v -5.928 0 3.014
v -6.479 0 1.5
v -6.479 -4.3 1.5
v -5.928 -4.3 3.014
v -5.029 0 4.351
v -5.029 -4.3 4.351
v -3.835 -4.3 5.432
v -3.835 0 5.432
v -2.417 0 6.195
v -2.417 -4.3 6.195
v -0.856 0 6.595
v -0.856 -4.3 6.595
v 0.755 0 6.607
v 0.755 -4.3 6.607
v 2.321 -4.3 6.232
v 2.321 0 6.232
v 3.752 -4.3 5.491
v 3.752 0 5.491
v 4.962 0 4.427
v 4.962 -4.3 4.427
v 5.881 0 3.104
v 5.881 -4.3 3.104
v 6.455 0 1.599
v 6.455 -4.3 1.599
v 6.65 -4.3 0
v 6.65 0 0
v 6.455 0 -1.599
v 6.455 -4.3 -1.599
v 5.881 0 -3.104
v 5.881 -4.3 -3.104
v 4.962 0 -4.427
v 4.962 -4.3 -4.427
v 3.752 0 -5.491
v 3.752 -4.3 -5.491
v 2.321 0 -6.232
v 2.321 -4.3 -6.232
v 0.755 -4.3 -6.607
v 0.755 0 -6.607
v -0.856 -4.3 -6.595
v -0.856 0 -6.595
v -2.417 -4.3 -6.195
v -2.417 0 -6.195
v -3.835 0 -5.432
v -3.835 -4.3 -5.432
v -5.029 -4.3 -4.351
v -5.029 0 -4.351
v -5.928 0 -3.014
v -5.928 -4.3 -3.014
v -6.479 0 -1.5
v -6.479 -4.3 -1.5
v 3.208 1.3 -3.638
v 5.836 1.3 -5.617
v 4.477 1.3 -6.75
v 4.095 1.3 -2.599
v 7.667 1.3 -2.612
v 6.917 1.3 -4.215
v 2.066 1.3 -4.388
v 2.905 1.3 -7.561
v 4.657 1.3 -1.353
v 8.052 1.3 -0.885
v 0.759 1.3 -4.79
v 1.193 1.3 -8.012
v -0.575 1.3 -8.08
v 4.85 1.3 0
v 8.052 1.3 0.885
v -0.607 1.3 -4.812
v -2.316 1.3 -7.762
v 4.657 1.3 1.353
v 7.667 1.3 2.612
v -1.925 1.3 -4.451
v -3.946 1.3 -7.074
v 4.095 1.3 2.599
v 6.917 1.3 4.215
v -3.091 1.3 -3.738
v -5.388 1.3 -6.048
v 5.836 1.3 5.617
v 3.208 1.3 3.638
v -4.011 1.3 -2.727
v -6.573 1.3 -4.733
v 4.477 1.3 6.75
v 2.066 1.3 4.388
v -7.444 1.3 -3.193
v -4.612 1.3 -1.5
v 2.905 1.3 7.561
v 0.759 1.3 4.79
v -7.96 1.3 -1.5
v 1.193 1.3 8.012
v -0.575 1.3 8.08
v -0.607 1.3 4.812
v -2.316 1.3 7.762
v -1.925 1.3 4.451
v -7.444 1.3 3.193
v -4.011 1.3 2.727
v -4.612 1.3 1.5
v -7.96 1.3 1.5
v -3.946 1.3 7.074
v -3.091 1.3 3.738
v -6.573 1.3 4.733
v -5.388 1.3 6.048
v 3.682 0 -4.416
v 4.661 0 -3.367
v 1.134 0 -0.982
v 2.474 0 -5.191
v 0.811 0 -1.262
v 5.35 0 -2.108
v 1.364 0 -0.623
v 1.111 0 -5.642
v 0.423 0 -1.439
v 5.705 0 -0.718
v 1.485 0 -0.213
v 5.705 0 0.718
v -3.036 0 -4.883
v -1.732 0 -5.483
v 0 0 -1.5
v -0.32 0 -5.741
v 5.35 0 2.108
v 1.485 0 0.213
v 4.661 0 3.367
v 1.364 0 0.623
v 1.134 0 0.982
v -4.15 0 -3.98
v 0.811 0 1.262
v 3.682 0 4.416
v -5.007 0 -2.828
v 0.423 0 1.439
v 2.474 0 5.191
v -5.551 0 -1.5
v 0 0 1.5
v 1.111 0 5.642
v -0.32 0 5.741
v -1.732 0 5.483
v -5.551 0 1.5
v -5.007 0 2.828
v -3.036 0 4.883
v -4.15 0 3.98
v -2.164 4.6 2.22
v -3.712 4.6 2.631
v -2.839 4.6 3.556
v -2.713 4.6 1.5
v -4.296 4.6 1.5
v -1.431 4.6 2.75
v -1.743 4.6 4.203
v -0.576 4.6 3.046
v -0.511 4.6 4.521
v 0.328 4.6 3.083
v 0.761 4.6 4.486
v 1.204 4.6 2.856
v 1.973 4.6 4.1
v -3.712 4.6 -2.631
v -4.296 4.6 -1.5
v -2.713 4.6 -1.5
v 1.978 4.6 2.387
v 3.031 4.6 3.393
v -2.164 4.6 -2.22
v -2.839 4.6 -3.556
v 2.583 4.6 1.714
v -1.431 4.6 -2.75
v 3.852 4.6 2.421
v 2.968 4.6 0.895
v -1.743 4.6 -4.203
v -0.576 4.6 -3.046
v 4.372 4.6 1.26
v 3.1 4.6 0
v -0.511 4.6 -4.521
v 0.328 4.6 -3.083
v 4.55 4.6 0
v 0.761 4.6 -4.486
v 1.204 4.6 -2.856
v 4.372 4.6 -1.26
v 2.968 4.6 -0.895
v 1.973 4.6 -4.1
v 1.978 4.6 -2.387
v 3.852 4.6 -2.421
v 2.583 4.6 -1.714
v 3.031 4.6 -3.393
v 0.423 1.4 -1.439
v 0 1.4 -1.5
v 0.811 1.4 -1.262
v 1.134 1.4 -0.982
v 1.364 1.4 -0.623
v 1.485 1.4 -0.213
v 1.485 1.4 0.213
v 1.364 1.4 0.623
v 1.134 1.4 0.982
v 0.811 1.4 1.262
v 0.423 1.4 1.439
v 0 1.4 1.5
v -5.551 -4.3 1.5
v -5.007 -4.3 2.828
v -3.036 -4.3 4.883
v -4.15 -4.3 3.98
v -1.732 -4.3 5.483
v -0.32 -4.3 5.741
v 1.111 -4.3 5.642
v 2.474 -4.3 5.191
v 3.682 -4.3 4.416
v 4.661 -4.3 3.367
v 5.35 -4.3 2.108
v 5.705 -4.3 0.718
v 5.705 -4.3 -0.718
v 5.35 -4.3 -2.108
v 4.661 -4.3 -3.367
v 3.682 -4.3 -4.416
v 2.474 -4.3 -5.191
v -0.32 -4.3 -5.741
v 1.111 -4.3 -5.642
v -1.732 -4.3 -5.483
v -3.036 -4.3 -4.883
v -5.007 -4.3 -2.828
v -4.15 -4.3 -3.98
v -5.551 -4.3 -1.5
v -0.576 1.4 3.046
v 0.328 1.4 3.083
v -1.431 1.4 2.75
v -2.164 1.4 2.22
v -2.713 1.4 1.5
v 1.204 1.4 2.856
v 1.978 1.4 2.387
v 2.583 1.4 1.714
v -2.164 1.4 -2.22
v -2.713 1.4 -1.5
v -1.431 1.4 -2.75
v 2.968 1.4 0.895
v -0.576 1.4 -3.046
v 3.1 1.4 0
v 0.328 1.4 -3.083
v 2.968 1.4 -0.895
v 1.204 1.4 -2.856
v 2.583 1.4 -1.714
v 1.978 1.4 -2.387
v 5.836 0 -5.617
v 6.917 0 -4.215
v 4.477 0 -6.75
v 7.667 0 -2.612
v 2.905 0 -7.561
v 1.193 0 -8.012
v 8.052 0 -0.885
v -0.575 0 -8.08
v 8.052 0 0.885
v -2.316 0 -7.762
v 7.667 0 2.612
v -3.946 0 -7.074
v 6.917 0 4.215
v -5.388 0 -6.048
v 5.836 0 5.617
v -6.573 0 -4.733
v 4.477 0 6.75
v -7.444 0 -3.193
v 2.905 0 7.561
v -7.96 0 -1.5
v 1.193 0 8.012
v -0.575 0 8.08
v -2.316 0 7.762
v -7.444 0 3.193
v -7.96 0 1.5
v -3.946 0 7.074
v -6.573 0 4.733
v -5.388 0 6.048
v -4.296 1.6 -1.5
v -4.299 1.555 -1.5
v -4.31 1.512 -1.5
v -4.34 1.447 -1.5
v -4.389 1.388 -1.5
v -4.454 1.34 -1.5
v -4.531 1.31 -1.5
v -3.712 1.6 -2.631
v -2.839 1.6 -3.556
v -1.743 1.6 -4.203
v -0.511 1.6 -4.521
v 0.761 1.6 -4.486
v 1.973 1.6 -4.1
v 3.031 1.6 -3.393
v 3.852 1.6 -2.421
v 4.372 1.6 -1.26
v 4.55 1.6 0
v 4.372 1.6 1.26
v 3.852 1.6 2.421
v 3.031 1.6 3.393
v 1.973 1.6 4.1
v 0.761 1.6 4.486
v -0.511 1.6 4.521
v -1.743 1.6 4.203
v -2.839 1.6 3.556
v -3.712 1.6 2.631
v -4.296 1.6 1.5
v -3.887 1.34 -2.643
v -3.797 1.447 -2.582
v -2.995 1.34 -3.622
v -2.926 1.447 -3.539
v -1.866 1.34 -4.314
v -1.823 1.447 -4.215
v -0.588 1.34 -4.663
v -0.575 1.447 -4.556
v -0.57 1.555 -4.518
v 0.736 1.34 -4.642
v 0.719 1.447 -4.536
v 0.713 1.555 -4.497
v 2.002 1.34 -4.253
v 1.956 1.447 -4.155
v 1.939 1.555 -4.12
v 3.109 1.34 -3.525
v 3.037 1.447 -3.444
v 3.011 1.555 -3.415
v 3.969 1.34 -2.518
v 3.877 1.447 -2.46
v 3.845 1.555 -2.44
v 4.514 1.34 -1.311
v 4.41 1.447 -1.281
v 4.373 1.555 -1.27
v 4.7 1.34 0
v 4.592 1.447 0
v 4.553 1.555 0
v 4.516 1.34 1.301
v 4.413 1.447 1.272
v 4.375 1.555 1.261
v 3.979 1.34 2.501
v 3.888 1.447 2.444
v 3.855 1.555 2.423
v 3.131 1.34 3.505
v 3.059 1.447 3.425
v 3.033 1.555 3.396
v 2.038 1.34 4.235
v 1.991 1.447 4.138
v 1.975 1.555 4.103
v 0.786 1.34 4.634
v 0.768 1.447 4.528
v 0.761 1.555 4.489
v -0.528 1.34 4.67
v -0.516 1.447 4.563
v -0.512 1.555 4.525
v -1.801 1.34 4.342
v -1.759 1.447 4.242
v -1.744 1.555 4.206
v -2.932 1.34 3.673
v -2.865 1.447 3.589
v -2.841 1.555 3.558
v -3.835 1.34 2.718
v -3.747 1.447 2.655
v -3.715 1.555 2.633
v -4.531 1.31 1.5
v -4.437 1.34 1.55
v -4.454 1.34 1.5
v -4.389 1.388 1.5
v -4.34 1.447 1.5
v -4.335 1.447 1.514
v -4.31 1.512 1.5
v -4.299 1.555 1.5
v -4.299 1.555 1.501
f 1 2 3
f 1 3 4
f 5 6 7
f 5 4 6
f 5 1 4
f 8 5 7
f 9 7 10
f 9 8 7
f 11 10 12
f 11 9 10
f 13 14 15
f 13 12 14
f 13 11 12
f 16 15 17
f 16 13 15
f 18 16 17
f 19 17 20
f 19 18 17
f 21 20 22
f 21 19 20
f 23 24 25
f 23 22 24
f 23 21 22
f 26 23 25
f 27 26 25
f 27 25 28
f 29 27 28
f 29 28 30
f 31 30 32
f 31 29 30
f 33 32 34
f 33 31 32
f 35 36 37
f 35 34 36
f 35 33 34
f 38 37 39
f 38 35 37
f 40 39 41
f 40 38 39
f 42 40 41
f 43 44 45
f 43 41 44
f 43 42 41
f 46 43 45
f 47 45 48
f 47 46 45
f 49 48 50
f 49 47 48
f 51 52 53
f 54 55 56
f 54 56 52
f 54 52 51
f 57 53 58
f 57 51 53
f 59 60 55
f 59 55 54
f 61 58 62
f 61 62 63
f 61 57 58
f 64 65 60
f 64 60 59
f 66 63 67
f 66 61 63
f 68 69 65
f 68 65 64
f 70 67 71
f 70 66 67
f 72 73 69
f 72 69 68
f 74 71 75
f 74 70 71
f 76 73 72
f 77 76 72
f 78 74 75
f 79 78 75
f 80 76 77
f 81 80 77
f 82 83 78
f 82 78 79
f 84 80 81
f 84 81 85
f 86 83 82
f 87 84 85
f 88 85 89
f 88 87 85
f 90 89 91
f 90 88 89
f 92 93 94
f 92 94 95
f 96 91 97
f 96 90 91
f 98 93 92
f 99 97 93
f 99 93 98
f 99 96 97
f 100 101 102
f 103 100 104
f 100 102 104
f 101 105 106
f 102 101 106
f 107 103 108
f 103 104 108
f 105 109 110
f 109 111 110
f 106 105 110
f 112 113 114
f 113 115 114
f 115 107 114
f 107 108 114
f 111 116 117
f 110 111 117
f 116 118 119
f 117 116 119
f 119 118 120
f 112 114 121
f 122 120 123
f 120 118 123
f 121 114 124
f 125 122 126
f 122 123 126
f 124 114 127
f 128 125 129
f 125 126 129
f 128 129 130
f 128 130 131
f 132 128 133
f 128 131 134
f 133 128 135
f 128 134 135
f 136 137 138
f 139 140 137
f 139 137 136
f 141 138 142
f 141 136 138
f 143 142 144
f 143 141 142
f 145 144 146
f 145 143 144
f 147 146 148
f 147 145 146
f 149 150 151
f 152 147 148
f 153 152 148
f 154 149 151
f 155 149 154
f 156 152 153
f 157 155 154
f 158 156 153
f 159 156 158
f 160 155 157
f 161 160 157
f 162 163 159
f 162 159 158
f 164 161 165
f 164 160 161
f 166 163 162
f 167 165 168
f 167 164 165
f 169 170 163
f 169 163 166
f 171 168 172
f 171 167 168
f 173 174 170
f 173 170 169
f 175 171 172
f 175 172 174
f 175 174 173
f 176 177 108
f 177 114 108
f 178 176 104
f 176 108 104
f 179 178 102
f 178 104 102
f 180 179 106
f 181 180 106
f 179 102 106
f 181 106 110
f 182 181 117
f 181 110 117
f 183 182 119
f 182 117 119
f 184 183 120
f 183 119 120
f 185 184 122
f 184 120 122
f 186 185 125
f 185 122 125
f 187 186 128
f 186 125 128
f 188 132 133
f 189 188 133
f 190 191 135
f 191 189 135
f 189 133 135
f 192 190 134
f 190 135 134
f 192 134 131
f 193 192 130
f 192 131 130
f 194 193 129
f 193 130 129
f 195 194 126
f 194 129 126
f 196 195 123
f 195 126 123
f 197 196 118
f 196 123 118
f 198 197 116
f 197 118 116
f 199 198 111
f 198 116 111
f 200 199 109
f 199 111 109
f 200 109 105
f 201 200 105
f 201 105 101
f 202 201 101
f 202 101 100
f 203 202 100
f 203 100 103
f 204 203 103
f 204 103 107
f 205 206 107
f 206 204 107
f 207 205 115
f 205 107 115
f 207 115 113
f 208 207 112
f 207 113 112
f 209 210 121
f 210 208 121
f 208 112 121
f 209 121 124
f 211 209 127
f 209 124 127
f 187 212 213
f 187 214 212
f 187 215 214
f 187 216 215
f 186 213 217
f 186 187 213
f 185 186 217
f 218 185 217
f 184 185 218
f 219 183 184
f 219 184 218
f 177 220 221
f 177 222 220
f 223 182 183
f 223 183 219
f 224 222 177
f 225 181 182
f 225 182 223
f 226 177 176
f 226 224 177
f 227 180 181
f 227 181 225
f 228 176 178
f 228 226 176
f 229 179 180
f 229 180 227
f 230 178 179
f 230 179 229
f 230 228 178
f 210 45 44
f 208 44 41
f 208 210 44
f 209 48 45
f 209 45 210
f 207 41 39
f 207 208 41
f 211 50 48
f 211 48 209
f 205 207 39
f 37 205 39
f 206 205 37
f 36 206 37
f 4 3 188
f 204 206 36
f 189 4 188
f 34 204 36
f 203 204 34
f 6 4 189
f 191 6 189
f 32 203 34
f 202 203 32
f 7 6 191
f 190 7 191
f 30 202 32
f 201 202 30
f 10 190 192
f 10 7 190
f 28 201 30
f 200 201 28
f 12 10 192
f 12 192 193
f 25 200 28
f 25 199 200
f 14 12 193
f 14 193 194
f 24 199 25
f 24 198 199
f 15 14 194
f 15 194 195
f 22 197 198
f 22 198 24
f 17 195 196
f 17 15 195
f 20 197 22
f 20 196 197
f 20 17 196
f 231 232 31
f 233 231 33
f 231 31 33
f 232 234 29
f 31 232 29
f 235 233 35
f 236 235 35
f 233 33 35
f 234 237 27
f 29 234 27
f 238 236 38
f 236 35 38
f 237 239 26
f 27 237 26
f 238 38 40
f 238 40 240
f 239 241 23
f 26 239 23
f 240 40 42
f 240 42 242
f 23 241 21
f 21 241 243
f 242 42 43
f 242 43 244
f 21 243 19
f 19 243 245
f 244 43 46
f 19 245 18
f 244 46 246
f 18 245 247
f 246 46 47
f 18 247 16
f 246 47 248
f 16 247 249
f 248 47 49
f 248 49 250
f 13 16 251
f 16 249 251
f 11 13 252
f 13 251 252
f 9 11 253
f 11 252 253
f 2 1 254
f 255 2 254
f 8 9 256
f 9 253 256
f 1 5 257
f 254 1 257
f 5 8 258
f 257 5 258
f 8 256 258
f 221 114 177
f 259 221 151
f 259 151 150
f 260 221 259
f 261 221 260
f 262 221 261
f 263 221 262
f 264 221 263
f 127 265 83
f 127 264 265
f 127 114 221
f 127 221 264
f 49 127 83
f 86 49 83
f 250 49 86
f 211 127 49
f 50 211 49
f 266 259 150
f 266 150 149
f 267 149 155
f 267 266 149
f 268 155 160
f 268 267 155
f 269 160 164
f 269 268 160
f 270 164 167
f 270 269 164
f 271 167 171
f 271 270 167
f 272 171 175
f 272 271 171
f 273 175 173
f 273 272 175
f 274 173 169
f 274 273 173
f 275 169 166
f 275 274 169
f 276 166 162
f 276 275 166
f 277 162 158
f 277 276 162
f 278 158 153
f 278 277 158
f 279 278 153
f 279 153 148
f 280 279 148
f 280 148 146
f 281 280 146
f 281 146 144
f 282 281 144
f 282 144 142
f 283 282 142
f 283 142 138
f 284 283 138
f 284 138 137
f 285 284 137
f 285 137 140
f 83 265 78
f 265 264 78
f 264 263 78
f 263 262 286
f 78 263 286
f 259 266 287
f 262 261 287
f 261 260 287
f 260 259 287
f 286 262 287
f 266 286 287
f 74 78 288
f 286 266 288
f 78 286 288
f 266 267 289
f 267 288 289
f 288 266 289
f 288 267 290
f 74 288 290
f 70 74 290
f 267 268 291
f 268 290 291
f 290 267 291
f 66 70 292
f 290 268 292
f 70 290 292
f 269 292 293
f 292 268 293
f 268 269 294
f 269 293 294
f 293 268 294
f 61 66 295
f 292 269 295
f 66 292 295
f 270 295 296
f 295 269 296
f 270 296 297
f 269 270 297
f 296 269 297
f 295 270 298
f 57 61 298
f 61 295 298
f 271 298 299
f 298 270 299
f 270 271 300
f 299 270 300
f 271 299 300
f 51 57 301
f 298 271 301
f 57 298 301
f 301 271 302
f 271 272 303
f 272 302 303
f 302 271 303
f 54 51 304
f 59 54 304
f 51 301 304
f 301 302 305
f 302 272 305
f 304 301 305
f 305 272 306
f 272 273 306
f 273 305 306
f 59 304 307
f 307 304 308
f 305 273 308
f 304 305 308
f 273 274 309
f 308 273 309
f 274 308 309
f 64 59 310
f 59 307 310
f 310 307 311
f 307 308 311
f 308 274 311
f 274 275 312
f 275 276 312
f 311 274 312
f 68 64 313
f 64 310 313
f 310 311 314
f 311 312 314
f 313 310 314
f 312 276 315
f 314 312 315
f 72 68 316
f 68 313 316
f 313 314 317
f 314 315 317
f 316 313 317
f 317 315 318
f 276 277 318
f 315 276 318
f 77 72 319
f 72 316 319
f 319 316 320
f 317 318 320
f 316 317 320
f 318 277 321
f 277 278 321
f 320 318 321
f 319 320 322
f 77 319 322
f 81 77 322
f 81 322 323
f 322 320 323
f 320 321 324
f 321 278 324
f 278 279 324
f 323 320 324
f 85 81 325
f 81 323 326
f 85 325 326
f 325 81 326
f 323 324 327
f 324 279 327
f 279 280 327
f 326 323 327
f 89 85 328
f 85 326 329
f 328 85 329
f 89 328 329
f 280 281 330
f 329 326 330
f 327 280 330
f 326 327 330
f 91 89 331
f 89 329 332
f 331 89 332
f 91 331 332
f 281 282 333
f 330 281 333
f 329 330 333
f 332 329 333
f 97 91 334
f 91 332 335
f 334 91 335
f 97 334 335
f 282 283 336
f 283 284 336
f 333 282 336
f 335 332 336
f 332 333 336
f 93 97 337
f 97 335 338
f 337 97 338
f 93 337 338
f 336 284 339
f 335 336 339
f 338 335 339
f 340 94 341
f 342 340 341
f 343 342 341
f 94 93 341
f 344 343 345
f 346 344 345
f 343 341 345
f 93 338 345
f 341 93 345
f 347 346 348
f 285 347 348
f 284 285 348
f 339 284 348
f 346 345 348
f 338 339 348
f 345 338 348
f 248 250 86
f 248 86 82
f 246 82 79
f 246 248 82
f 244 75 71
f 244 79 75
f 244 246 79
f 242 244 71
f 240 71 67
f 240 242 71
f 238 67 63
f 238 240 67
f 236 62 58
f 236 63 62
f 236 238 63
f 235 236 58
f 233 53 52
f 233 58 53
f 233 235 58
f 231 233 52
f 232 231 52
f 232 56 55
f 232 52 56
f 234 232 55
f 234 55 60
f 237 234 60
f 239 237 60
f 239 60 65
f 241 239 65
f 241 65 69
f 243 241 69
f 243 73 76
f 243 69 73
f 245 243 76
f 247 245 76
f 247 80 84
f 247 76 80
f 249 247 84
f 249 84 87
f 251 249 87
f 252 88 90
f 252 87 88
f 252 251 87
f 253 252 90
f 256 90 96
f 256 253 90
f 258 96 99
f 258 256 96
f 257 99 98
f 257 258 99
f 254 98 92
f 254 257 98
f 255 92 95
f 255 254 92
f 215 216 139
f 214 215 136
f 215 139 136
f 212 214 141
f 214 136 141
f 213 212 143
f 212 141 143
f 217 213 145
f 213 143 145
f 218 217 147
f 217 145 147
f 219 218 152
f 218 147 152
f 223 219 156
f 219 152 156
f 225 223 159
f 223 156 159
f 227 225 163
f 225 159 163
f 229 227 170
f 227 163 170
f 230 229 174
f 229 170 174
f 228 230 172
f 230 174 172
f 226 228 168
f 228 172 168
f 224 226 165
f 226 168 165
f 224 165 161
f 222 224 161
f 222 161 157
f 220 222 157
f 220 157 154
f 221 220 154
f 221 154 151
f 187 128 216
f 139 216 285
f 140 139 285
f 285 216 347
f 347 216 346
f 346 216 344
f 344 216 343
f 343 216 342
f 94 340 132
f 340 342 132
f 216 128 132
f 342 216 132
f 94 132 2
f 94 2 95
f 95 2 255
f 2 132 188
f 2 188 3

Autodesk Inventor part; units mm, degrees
ref_plane "YZ Plane" through (0, 0, 0) normal (1, 0, 0) x (0, 1, 0)
ref_plane "XZ Plane" through (0, 0, 0) normal (0, 1, 0) x (-1, 0, 0)
ref_plane "XY Plane" through (0, 0, 0) normal (0, 0, 1) x (1, 0, 0)
sketch "Boceto1" plane through (0, 0, 0) normal (0, 1, 0) x (-1, 0, 0)
  circle A0 centre (0, 0) radius 8.1
  dimension "d0" = 16.2
extrude "Extrusión1" add sketch "Boceto1" along normal blind 1.3
sketch "Boceto2" plane through (0, 1.3, 0) normal (0, 1, 0) x (1, 0, 0)
  circle A0 centre (0, 0) radius 4.55
  dimension "d3" = 9.1
extrude "Extrusión2" add sketch "Boceto2" along normal blind 3.3
sketch "Boceto3" plane through (0, 4.6, 0) normal (0, 1, 0) x (1, 0, 0)
  circle A0 centre (0, 0) radius 3.1
  dimension "d6" = 6.2
extrude "Extrusión3" cut sketch "Boceto3" against normal blind 3.2
sketch "Boceto4" plane through (0, 1.4, 0) normal (0, 1, 0) x (1, 0, 0)
  arc A0 (0, -1.5) -> (0, 1.5) centre (0, 0) ccw
  line L0 (0, -1.5) -> (-7.9599, -1.5)
  circle A1 centre (0, 0) radius 8.1 projected
  line L1 (0, 1.5) -> (-7.9599, 1.5)
  arc A2 (-7.9599, 1.5) -> (-7.9599, -1.5) centre (0, 0) ccw
  dimension "d9" = 3
extrude "Extrusión4" cut sketch "Boceto4" along normal blind 3.2 and the other way blind 1.6 contours L0 A1 L1 A0 picked at (-2.6948, -0.1675)
fillet "Empalme1" radius 0.3 1 edges at (4.55, 1.3, 0)
sketch "Boceto5" plane through (0, 0, 0) normal (0, -1, 0) x (1, 0, 0)
  arc A0 (-6.4786, -1.5) -> (-6.4786, 1.5) centre (0, 0) ccw
  arc A1 (-5.5509, -1.5) -> (-5.5509, 1.5) centre (0, 0) ccw
  line L0 (-7.9599, 1.5) -> (0, 1.5) projected
  line L1 (-5.5509, 1.5) -> (-6.4786, 1.5)
  line L2 (-7.9599, -1.5) -> (-4.6122, -1.5) projected
  line L3 (-6.4786, -1.5) -> (-5.5509, -1.5)
  dimension "d15" = 13.3
  dimension "d16" = 11.5
extrude "Extrusión5" add sketch "Boceto5" along normal blind 4.3
properties part number "Pieza_Presion_resorte" material "Plástico ABS"
